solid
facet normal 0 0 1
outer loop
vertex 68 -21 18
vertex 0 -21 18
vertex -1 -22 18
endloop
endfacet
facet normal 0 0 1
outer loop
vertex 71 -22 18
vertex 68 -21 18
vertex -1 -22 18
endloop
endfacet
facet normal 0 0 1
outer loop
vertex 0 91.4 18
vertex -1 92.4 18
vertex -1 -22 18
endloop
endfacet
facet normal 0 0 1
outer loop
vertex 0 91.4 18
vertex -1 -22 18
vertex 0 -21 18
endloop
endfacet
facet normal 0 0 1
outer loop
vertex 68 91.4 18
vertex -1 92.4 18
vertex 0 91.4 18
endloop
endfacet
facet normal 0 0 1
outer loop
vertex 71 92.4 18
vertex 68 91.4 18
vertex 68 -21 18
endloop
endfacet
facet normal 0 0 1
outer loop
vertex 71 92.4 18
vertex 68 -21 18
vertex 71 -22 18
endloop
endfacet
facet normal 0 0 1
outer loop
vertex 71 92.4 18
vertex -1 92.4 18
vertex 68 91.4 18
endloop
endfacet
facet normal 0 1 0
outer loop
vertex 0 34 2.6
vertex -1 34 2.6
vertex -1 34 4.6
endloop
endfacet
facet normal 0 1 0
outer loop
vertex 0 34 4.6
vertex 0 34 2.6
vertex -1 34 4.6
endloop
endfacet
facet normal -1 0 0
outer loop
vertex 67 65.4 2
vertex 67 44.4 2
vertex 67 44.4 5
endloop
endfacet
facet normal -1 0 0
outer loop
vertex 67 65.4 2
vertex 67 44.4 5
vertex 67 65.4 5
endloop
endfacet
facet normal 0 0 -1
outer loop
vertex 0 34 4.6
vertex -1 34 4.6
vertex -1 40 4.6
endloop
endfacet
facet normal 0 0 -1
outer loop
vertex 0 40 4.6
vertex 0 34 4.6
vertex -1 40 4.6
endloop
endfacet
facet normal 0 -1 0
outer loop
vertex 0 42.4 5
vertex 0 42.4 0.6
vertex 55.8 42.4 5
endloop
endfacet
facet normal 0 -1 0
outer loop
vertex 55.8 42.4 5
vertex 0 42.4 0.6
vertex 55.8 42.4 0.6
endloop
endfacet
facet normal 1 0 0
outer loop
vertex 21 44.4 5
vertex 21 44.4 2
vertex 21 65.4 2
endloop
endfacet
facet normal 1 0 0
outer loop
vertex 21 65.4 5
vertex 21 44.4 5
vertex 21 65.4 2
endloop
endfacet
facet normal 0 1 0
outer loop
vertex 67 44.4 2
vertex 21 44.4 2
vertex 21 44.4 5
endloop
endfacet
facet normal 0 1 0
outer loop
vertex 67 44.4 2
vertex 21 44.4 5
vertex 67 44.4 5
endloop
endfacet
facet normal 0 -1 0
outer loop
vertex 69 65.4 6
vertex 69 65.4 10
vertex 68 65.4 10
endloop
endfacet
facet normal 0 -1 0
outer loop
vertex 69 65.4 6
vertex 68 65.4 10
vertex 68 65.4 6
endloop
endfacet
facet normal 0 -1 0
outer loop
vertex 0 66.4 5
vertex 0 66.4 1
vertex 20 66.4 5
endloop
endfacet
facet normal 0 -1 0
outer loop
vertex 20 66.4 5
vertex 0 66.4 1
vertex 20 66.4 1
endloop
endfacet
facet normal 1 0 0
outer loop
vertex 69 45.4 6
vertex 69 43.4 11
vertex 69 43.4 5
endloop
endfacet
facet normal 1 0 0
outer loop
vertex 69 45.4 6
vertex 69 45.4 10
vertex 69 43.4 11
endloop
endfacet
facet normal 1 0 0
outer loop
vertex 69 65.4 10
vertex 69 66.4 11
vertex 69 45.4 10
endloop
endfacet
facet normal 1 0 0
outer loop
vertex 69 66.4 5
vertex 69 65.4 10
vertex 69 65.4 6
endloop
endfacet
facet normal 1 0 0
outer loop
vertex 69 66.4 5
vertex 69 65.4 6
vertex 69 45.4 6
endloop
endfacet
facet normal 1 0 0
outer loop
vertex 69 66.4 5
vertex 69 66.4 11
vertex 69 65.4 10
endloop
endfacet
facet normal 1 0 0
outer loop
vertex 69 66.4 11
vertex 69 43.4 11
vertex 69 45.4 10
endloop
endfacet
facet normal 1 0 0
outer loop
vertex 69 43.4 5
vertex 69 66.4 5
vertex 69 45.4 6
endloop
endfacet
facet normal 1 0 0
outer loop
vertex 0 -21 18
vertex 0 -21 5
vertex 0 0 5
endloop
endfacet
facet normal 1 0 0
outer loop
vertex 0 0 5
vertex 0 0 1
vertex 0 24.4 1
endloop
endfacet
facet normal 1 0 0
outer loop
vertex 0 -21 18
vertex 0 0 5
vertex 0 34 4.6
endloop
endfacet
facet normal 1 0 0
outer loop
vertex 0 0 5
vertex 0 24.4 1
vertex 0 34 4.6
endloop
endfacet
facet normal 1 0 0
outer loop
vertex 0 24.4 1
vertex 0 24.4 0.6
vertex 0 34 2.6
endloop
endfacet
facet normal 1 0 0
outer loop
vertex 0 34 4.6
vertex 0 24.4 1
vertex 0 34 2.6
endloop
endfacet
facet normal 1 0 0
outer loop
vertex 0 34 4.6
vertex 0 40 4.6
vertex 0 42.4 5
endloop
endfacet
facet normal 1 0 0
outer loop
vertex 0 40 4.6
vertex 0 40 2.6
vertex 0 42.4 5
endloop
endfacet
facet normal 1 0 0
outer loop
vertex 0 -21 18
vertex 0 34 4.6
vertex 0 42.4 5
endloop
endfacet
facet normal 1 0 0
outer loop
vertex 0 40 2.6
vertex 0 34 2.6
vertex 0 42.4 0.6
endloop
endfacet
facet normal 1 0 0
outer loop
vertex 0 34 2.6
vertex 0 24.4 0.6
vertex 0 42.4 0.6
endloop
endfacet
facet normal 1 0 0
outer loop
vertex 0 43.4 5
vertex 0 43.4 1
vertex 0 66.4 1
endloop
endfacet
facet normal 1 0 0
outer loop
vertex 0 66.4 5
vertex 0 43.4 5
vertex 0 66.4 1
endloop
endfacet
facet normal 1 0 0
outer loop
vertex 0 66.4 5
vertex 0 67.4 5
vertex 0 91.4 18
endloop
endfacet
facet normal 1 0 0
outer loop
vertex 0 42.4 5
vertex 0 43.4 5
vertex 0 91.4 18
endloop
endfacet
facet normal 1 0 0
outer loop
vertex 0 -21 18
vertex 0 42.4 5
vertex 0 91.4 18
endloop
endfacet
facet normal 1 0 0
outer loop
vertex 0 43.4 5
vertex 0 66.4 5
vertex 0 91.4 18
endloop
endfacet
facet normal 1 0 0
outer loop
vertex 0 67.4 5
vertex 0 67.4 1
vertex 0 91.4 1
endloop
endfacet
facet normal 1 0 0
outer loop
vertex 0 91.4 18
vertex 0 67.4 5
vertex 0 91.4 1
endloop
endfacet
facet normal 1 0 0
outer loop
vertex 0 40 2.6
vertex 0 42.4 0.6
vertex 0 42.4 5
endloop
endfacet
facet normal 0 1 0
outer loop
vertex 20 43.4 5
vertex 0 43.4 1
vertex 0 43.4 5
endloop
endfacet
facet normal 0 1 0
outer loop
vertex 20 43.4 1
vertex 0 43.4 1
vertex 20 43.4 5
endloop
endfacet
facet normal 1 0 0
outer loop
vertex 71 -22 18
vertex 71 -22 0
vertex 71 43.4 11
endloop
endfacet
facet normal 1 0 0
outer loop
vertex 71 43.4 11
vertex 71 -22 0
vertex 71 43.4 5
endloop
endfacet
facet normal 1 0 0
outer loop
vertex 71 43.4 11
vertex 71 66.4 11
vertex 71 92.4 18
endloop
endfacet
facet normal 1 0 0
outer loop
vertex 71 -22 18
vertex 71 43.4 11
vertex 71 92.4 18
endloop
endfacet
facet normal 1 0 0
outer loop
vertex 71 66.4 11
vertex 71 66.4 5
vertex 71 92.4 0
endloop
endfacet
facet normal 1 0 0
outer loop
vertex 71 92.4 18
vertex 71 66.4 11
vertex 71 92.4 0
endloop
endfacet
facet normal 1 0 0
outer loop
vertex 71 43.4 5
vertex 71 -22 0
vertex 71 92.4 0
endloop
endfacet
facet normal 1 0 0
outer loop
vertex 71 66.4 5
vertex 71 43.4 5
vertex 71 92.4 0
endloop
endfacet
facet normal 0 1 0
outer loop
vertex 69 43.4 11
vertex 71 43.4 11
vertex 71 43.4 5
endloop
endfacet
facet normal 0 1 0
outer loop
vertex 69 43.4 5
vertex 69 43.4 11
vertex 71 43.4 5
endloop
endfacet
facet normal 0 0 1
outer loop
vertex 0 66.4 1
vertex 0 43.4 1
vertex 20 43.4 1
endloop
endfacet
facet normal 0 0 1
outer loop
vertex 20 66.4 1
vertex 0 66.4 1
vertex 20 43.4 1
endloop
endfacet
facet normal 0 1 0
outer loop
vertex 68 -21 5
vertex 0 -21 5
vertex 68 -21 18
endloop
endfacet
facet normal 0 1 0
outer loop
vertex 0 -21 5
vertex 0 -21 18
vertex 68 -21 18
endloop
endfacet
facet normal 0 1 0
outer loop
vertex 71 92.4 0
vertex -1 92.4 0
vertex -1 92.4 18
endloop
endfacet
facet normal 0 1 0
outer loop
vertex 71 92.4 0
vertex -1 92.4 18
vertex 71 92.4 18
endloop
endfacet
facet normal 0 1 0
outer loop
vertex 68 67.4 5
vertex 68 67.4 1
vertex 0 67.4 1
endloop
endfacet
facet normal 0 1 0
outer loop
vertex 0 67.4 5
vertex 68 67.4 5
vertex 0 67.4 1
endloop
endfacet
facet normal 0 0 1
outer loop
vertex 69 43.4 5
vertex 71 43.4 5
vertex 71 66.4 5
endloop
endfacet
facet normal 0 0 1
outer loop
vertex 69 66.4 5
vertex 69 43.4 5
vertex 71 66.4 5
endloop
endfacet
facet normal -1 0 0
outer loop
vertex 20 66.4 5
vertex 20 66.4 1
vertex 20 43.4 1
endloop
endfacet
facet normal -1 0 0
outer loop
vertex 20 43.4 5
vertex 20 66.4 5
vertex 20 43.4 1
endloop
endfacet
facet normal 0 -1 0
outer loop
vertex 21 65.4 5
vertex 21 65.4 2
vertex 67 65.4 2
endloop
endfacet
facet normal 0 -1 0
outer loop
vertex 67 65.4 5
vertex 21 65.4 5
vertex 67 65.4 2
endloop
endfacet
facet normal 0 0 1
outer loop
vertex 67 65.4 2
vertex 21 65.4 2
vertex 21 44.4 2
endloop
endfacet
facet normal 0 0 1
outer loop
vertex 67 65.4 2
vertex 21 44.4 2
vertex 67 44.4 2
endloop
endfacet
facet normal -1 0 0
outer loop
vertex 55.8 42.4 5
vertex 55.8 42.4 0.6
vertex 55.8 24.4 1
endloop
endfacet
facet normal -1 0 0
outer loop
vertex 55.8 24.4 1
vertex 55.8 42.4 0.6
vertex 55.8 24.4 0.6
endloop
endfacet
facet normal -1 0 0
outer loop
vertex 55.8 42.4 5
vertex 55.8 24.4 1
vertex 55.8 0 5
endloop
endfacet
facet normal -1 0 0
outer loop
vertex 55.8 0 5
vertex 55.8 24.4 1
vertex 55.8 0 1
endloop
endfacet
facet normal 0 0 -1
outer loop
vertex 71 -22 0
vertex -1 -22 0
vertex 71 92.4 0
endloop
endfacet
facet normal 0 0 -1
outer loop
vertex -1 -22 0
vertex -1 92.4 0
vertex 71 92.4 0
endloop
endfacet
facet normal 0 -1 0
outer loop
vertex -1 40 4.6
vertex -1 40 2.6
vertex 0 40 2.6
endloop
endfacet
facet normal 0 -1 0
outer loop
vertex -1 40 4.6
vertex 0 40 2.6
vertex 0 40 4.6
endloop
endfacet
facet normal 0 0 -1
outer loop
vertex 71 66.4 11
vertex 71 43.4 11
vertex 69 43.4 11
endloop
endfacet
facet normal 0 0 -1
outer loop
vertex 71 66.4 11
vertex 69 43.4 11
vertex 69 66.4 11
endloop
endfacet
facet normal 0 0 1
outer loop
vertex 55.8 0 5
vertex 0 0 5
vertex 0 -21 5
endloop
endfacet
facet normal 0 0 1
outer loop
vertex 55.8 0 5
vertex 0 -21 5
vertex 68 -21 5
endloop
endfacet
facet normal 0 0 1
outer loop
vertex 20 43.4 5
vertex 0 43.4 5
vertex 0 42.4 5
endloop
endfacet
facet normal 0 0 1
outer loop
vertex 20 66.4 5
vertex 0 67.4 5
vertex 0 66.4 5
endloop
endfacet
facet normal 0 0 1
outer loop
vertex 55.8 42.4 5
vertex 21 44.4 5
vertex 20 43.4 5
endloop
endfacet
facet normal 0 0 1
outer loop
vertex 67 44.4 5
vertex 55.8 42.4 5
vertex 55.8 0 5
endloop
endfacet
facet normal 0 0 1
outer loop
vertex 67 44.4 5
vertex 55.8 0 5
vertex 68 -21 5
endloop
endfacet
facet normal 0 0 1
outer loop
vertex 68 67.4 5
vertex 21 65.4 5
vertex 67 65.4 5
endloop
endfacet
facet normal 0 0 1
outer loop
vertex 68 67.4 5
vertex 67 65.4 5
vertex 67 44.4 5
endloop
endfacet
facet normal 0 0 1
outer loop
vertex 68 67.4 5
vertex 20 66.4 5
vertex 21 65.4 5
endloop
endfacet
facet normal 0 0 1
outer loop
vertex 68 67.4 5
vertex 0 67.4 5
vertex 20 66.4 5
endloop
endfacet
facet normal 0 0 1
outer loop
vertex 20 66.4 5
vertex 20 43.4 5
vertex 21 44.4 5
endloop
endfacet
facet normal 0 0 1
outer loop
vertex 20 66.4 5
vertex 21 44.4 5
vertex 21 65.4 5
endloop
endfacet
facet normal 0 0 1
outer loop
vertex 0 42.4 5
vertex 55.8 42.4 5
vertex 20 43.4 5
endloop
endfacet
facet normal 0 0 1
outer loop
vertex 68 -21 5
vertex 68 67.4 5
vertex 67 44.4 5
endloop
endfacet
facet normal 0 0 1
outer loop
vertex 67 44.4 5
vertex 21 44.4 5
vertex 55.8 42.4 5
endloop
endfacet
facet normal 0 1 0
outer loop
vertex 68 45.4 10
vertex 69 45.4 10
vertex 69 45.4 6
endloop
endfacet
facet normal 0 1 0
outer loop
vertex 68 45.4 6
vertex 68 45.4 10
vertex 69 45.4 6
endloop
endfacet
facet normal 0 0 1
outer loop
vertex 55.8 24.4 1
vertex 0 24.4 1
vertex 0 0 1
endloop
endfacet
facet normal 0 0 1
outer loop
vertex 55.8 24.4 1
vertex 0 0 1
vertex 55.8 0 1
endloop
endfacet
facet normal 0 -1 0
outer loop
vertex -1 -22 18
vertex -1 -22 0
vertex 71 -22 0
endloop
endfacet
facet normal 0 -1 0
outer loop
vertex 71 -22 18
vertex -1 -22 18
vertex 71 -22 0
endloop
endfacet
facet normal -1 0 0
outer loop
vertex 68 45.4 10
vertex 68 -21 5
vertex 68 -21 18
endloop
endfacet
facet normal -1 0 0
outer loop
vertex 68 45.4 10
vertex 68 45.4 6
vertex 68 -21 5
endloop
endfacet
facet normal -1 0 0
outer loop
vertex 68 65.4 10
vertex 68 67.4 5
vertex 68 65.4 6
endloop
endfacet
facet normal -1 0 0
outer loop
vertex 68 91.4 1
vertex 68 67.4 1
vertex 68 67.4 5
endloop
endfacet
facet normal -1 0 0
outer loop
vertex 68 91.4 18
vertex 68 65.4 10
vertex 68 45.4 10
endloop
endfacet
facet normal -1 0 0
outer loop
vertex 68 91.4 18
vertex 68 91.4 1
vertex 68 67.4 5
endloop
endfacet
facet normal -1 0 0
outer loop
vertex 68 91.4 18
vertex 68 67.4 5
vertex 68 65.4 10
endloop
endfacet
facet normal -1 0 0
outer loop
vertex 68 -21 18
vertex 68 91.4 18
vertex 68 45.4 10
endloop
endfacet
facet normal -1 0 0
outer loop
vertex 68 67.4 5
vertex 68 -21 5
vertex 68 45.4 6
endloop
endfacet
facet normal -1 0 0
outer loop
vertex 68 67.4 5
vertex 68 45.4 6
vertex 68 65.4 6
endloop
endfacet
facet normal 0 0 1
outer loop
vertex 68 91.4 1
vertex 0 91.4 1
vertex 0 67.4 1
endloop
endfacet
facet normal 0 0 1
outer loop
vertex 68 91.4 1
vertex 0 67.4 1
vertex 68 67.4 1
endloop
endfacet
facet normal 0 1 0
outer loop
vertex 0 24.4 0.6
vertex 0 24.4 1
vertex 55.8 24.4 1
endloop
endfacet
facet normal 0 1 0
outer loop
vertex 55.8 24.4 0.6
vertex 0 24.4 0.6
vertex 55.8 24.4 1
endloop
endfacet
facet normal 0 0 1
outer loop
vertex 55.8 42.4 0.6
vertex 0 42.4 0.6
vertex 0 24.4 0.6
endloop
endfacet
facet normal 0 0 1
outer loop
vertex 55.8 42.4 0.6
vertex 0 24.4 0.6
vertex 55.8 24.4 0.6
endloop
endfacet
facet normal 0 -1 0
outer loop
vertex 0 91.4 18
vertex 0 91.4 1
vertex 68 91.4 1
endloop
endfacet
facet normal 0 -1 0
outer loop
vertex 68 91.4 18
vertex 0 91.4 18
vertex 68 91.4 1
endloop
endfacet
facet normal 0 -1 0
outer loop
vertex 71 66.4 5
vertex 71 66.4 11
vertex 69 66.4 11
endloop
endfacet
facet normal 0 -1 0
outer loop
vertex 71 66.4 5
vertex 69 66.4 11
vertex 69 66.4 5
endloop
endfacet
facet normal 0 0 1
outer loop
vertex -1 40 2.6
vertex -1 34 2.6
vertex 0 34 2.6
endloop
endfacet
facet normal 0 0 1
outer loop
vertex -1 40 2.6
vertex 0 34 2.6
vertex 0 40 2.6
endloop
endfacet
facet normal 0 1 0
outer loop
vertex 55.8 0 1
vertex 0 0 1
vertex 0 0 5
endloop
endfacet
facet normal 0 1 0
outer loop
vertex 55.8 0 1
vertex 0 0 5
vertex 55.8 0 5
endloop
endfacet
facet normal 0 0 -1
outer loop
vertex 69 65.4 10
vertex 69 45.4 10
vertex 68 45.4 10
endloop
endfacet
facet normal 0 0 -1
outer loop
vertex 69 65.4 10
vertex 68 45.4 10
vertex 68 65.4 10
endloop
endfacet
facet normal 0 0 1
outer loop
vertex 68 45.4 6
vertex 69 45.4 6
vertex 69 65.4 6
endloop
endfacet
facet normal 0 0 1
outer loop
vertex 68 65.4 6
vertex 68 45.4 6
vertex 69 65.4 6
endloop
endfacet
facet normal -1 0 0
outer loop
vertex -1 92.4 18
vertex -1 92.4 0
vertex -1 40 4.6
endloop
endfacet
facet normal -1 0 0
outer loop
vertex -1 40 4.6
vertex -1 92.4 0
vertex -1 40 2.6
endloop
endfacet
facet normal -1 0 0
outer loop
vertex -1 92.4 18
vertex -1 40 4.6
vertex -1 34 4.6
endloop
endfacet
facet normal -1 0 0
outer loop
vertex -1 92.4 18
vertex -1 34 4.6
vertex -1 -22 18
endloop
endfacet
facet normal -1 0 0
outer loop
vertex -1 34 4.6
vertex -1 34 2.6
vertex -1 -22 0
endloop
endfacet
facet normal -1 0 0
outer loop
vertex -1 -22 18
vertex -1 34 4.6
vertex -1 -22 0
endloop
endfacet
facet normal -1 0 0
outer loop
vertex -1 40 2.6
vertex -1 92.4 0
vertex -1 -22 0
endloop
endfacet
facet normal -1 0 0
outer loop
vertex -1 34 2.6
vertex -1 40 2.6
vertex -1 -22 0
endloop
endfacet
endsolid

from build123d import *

# Parameters (mm, degrees)
SKICA1_W                       = 57.8
SKICA1_H                       = 44.4
SKICA1_W_2                     = 55.8
SKICA1_H_2                     = 42.4
VYSUNOUT_TENKOST_NN_1_DEPTH    = 18
SKICA1_2_W                     = 55.8
SKICA1_2_H                     = 42.4
P_IDAT_VYSUNUT_M1_DEPTH        = 1
SKICA2_W                       = 55.8
SKICA2_H                       = 1
ODEBRAT_VYSUNUT_M3_DEPTH       = 13
SKICA3_W                       = 2
SKICA3_H                       = 6
ODEBRAT_VYSUNUT_M4_DEPTH       = 10
SKICA4_W                       = 55.8
SKICA4_H                       = 18
ODEBRAT_VYSUNUT_M5_DEPTH       = 0.4
SKICA5_W                       = 22
SKICA5_H                       = 25
SKICA5_W_2                     = 20
SKICA5_H_2                     = 23
VYSUNOUT_TENKOST_NN_2_DEPTH    = 18
SKICA5_2_W                     = 20
SKICA5_2_H                     = 23
P_IDAT_VYSUNUT_M2_DEPTH        = 1
SKICA7_W                       = 48
SKICA7_H                       = 23
SKICA7_W_2                     = 46
SKICA7_H_2                     = 21
VYSUNOUT_TENKOST_NN_3_DEPTH    = 18
SKICA7_2_W                     = 46
SKICA7_2_H                     = 21
P_IDAT_VYSUNUT_M3_DEPTH        = 2
SKICA8_W                       = 68
SKICA8_H                       = 24
P_IDAT_VYSUNUT_M4_DEPTH        = 1
SKICA8_2_W                     = 70
SKICA8_2_H                     = 26
SKICA8_2_W_2                   = 68
SKICA8_2_H_2                   = 24
VYSUNOUT_TENKOST_NN_4_DEPTH    = 18
P_IDAT_VYSUNUT_M5_DEPTH        = 18
SKICA10_W                      = 6
SKICA10_H                      = 23
ODEBRAT_VYSUNUT_M7_DEPTH       = 2
SKICA15_W                      = 55.8
SKICA15_H                      = 13
ODEBRAT_VYSUNUT_M13_DEPTH      = 40
SKICA17_W                      = 68
SKICA17_H                      = 20
P_IDAT_VYSUNUT_M6_DEPTH        = 5
P_IDAT_VYSUNUT_M7_DEPTH        = 18
ODEBRAT_VYSUNUT_M14_DEPTH      = 86.4
ODEBRAT_VYSUNUT_M14_DEPTH_BACK = 10
SKICA16_W                      = 12.2
SKICA16_H                      = 13
SKICA19_W                      = 4
SKICA19_H                      = 20
ODEBRAT_VYSUNUT_M15_DEPTH      = 2


with BuildPart() as part:
    # Skica1 → Vysunout tenkostěnný1 (new body)
    with BuildSketch(Plane.XY):
        with Locations((27.9, 21.2)):
            Rectangle(SKICA1_W, SKICA1_H)
        with Locations((27.9, 21.2)):
            Rectangle(SKICA1_W_2, SKICA1_H_2, mode=Mode.SUBTRACT)
    extrude(amount=VYSUNOUT_TENKOST_NN_1_DEPTH)

    # Skica1<2> → Přidat vysunutím1 (add)
    with BuildSketch(Plane.XY):
        with Locations((27.9, 21.2)):
            Rectangle(SKICA1_2_W, SKICA1_2_H)
    extrude(amount=P_IDAT_VYSUNUT_M1_DEPTH)

    # Skica2 → Odebrat vysunutím3 (cut)
    with BuildSketch(Plane.XY.offset(18)):
        with Locations((27.9, -0.5)):
            Rectangle(SKICA2_W, SKICA2_H)
    extrude(amount=-ODEBRAT_VYSUNUT_M3_DEPTH, mode=Mode.SUBTRACT)

    # Skica3 → Odebrat vysunutím4 (cut)
    with BuildSketch(Plane.ZY.offset(1)):
        with Locations((3.6, 37)):
            Rectangle(SKICA3_W, SKICA3_H)
    extrude(amount=-ODEBRAT_VYSUNUT_M4_DEPTH, mode=Mode.SUBTRACT)

    # Skica4 → Odebrat vysunutím5 (cut)
    with BuildSketch(Plane.XY.offset(1)):
        with Locations((27.9, 33.4)):
            Rectangle(SKICA4_W, SKICA4_H)
    extrude(amount=-ODEBRAT_VYSUNUT_M5_DEPTH, mode=Mode.SUBTRACT)

    # Skica5 → Vysunout tenkostěnný2 (add)
    with BuildSketch(Plane.XY):
        with Locations((10, 54.9)):
            Rectangle(SKICA5_W, SKICA5_H)
        with Locations((10, 54.9)):
            Rectangle(SKICA5_W_2, SKICA5_H_2, mode=Mode.SUBTRACT)
    extrude(amount=VYSUNOUT_TENKOST_NN_2_DEPTH)

    # Skica5<2> → Přidat vysunutím2 (add)
    with BuildSketch(Plane.XY):
        with Locations((10, 54.9)):
            Rectangle(SKICA5_2_W, SKICA5_2_H)
    extrude(amount=P_IDAT_VYSUNUT_M2_DEPTH)

    # Skica7 → Vysunout tenkostěnný3 (add)
    with BuildSketch(Plane.XY):
        with Locations((44, 54.9)):
            Rectangle(SKICA7_W, SKICA7_H)
        with Locations((44, 54.9)):
            Rectangle(SKICA7_W_2, SKICA7_H_2, mode=Mode.SUBTRACT)
    extrude(amount=VYSUNOUT_TENKOST_NN_3_DEPTH)

    # Skica7<2> → Přidat vysunutím3 (add)
    with BuildSketch(Plane.XY):
        with Locations((44, 54.9)):
            Rectangle(SKICA7_2_W, SKICA7_2_H)
    extrude(amount=P_IDAT_VYSUNUT_M3_DEPTH)

    # Skica8 → Přidat vysunutím4 (add)
    with BuildSketch(Plane.XY):
        with Locations((34, 79.4)):
            Rectangle(SKICA8_W, SKICA8_H)
    extrude(amount=P_IDAT_VYSUNUT_M4_DEPTH)

    # Skica8<2> → Vysunout tenkostěnný4 (add)
    with BuildSketch(Plane.XY):
        with Locations((34, 79.4)):
            Rectangle(SKICA8_2_W, SKICA8_2_H)
        with Locations((34, 79.4)):
            Rectangle(SKICA8_2_W_2, SKICA8_2_H_2, mode=Mode.SUBTRACT)
    extrude(amount=VYSUNOUT_TENKOST_NN_4_DEPTH)

    # Skica9 → Přidat vysunutím5 (add)
    with BuildSketch(Plane.XY):
        Polygon((71, 92.4), (71, -1), (56.8, -1), (56.8, 43.4), (68, 43.4), (68, 92.4), align=None)
    extrude(amount=P_IDAT_VYSUNUT_M5_DEPTH)

    # Skica10 → Odebrat vysunutím7 (cut)
    with BuildSketch(Plane(origin=(71, 0, 0), x_dir=(0, 0, -1), z_dir=(1, 0, 0))):
        with Locations((-8, 54.9)):
            Rectangle(SKICA10_W, SKICA10_H)
    extrude(amount=-ODEBRAT_VYSUNUT_M7_DEPTH, mode=Mode.SUBTRACT)

    # Skica15 → Odebrat vysunutím13 (cut)
    with BuildSketch(Plane.XZ.offset(-42.4)):
        with Locations((27.9, 11.5)):
            Rectangle(SKICA15_W, SKICA15_H)
    extrude(amount=-ODEBRAT_VYSUNUT_M13_DEPTH, mode=Mode.SUBTRACT)

    # Skica17 → Přidat vysunutím6 (add)
    with BuildSketch(Plane.XY):
        with Locations((34, -11)):
            Rectangle(SKICA17_W, SKICA17_H)
    extrude(amount=P_IDAT_VYSUNUT_M6_DEPTH)

    # Skica18 → Přidat vysunutím7 (add)
    with BuildSketch(Plane.XY):
        Polygon((-1, -22), (71, -22), (71, -1), (55.8, -1), (55.8, -21), (0, -21), (0, -1), (-1, -1), align=None)
    extrude(amount=P_IDAT_VYSUNUT_M7_DEPTH)

    # Skica16 → Odebrat vysunutím14 (cut, two sides: drawn at the far end of the back side and taken through both)
    with BuildSketch(Plane.XZ.offset(-65.4).offset(-ODEBRAT_VYSUNUT_M14_DEPTH_BACK)):
        with Locations((61.9, 11.5)):
            Rectangle(SKICA16_W, SKICA16_H)
    extrude(amount=ODEBRAT_VYSUNUT_M14_DEPTH + ODEBRAT_VYSUNUT_M14_DEPTH_BACK, mode=Mode.SUBTRACT)

    # Skica19 → Odebrat vysunutím15 (cut)
    with BuildSketch(Plane(origin=(69, 0, 0), x_dir=(0, 0, -1), z_dir=(1, 0, 0))):
        with Locations((-8, 55.4)):
            Rectangle(SKICA19_W, SKICA19_H)
    extrude(amount=-ODEBRAT_VYSUNUT_M15_DEPTH, mode=Mode.SUBTRACT)


solid = part.part
